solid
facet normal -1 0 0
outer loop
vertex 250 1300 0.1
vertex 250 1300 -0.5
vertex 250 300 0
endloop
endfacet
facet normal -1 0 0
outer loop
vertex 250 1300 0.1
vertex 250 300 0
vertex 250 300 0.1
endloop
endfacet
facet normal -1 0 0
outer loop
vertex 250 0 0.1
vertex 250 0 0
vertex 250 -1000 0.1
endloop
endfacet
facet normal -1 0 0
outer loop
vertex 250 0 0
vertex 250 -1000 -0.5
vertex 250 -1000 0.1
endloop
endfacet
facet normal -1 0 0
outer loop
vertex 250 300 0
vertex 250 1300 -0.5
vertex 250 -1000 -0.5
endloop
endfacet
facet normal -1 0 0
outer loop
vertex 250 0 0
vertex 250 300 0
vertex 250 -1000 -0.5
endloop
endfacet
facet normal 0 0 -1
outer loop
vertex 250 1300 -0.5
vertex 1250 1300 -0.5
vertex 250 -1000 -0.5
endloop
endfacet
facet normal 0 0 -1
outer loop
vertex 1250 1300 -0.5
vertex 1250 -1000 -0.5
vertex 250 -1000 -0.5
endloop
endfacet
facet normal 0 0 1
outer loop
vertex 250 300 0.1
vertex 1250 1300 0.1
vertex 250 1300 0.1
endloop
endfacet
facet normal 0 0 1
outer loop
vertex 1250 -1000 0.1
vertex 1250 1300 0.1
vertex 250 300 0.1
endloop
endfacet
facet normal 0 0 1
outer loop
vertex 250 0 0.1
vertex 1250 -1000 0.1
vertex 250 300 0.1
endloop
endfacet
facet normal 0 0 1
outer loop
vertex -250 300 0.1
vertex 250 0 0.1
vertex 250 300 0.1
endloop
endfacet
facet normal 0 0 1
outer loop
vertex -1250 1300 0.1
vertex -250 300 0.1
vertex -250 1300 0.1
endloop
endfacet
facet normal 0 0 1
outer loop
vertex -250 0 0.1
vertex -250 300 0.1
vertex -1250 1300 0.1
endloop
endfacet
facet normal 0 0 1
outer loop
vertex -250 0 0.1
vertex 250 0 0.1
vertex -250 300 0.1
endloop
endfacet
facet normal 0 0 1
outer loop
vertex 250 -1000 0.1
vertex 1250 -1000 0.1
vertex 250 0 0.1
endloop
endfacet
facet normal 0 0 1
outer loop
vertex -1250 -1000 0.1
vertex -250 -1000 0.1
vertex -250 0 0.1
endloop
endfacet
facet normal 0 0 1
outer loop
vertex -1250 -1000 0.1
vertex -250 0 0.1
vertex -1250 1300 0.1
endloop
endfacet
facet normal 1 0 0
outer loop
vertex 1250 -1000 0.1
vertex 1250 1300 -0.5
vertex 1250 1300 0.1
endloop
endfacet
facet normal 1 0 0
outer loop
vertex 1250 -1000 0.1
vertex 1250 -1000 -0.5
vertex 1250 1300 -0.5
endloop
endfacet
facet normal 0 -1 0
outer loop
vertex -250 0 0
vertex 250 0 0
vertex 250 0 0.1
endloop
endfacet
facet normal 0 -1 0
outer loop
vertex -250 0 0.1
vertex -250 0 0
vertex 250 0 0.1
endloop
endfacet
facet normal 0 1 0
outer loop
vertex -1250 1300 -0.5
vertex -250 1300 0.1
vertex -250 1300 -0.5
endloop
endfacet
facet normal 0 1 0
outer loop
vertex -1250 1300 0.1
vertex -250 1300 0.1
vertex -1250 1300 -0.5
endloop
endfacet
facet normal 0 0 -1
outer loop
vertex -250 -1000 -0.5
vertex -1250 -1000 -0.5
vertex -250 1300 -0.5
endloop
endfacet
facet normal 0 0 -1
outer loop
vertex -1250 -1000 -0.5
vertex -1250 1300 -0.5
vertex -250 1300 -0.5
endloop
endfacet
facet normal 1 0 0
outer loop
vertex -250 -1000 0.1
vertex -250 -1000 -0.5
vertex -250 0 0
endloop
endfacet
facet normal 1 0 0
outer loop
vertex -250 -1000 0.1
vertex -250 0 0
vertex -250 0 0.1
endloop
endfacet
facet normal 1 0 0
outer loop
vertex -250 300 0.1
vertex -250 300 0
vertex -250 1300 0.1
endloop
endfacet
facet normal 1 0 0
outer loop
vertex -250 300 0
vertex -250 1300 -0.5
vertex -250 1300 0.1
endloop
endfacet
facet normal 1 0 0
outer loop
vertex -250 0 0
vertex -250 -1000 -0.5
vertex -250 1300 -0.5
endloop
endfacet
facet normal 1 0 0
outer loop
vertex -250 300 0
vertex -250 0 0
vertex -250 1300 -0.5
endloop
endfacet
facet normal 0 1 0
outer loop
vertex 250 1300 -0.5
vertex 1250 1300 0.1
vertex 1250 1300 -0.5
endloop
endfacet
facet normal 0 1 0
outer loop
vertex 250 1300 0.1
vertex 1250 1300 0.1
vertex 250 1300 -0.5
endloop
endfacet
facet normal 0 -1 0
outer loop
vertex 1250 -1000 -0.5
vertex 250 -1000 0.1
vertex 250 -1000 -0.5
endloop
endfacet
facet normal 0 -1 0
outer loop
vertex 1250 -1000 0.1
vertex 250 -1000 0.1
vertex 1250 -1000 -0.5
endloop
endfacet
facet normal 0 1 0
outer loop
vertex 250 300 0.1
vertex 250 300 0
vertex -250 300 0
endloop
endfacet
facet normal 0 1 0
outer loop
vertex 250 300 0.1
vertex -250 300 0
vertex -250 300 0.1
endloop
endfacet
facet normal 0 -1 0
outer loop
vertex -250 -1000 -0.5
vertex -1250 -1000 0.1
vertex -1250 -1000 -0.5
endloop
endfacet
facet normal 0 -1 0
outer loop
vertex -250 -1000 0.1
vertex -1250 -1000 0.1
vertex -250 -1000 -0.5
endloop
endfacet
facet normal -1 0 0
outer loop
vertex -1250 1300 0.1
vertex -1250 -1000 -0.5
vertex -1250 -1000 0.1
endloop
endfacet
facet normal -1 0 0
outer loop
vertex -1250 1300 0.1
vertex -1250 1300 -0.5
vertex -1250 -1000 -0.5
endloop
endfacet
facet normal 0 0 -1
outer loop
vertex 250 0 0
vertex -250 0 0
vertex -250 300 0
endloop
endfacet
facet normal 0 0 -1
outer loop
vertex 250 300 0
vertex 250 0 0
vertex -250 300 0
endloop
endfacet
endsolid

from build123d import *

# Parameters (mm, degrees)
F0_W     = 300
F0_H     = 0.1
F1_DEPTH = 250
F2_W     = 300
F2_H     = 0.6
F3_DEPTH = 1000
F4_W     = 300
F4_H     = 0.6
F5_DEPTH = 1000
F6_W     = 1000
F6_H     = 0.6
F7_DEPTH = 1000
F8_W     = 1000
F8_H     = 0.6
F9_DEPTH = 1000


with BuildPart() as f1:
    # F0 (on Right) → F1 (new body, symmetric)
    with BuildSketch(Plane.YZ):
        with Locations((150, 0.05)):
            Rectangle(F0_W, F0_H)
    extrude(amount=F1_DEPTH, both=True)

    # F2 (on face) → F3 (join)
    with BuildSketch(Plane.YZ.offset(250)):
        with Locations((150, -0.2)):
            Rectangle(F2_W, F2_H)
    extrude(amount=F3_DEPTH)

    # F4 (on face) → F5 (join)
    with BuildSketch(Plane(origin=(-250, 0, 0), x_dir=(0, -1, 0), z_dir=(-1, 0, 0))):
        with Locations((-150, -0.2)):
            Rectangle(F4_W, F4_H)
    extrude(amount=F5_DEPTH)

    # F6 (on face) → F7 (join)
    with BuildSketch(Plane.XZ):
        with Locations((-750, -0.2)):
            Rectangle(F6_W, F6_H)
        with Locations((750, -0.2)):
            Rectangle(F6_W, F6_H)
    extrude(amount=F7_DEPTH)

    # F8 (on face) → F9 (join)
    with BuildSketch(Plane(origin=(0, 300, 0), x_dir=(-1, 0, 0), z_dir=(0, 1, 0))):
        with Locations((-750, -0.2)):
            Rectangle(F8_W, F8_H)
        with Locations((750, -0.2)):
            Rectangle(F8_W, F8_H)
    extrude(amount=F9_DEPTH)


solid = f1.part
